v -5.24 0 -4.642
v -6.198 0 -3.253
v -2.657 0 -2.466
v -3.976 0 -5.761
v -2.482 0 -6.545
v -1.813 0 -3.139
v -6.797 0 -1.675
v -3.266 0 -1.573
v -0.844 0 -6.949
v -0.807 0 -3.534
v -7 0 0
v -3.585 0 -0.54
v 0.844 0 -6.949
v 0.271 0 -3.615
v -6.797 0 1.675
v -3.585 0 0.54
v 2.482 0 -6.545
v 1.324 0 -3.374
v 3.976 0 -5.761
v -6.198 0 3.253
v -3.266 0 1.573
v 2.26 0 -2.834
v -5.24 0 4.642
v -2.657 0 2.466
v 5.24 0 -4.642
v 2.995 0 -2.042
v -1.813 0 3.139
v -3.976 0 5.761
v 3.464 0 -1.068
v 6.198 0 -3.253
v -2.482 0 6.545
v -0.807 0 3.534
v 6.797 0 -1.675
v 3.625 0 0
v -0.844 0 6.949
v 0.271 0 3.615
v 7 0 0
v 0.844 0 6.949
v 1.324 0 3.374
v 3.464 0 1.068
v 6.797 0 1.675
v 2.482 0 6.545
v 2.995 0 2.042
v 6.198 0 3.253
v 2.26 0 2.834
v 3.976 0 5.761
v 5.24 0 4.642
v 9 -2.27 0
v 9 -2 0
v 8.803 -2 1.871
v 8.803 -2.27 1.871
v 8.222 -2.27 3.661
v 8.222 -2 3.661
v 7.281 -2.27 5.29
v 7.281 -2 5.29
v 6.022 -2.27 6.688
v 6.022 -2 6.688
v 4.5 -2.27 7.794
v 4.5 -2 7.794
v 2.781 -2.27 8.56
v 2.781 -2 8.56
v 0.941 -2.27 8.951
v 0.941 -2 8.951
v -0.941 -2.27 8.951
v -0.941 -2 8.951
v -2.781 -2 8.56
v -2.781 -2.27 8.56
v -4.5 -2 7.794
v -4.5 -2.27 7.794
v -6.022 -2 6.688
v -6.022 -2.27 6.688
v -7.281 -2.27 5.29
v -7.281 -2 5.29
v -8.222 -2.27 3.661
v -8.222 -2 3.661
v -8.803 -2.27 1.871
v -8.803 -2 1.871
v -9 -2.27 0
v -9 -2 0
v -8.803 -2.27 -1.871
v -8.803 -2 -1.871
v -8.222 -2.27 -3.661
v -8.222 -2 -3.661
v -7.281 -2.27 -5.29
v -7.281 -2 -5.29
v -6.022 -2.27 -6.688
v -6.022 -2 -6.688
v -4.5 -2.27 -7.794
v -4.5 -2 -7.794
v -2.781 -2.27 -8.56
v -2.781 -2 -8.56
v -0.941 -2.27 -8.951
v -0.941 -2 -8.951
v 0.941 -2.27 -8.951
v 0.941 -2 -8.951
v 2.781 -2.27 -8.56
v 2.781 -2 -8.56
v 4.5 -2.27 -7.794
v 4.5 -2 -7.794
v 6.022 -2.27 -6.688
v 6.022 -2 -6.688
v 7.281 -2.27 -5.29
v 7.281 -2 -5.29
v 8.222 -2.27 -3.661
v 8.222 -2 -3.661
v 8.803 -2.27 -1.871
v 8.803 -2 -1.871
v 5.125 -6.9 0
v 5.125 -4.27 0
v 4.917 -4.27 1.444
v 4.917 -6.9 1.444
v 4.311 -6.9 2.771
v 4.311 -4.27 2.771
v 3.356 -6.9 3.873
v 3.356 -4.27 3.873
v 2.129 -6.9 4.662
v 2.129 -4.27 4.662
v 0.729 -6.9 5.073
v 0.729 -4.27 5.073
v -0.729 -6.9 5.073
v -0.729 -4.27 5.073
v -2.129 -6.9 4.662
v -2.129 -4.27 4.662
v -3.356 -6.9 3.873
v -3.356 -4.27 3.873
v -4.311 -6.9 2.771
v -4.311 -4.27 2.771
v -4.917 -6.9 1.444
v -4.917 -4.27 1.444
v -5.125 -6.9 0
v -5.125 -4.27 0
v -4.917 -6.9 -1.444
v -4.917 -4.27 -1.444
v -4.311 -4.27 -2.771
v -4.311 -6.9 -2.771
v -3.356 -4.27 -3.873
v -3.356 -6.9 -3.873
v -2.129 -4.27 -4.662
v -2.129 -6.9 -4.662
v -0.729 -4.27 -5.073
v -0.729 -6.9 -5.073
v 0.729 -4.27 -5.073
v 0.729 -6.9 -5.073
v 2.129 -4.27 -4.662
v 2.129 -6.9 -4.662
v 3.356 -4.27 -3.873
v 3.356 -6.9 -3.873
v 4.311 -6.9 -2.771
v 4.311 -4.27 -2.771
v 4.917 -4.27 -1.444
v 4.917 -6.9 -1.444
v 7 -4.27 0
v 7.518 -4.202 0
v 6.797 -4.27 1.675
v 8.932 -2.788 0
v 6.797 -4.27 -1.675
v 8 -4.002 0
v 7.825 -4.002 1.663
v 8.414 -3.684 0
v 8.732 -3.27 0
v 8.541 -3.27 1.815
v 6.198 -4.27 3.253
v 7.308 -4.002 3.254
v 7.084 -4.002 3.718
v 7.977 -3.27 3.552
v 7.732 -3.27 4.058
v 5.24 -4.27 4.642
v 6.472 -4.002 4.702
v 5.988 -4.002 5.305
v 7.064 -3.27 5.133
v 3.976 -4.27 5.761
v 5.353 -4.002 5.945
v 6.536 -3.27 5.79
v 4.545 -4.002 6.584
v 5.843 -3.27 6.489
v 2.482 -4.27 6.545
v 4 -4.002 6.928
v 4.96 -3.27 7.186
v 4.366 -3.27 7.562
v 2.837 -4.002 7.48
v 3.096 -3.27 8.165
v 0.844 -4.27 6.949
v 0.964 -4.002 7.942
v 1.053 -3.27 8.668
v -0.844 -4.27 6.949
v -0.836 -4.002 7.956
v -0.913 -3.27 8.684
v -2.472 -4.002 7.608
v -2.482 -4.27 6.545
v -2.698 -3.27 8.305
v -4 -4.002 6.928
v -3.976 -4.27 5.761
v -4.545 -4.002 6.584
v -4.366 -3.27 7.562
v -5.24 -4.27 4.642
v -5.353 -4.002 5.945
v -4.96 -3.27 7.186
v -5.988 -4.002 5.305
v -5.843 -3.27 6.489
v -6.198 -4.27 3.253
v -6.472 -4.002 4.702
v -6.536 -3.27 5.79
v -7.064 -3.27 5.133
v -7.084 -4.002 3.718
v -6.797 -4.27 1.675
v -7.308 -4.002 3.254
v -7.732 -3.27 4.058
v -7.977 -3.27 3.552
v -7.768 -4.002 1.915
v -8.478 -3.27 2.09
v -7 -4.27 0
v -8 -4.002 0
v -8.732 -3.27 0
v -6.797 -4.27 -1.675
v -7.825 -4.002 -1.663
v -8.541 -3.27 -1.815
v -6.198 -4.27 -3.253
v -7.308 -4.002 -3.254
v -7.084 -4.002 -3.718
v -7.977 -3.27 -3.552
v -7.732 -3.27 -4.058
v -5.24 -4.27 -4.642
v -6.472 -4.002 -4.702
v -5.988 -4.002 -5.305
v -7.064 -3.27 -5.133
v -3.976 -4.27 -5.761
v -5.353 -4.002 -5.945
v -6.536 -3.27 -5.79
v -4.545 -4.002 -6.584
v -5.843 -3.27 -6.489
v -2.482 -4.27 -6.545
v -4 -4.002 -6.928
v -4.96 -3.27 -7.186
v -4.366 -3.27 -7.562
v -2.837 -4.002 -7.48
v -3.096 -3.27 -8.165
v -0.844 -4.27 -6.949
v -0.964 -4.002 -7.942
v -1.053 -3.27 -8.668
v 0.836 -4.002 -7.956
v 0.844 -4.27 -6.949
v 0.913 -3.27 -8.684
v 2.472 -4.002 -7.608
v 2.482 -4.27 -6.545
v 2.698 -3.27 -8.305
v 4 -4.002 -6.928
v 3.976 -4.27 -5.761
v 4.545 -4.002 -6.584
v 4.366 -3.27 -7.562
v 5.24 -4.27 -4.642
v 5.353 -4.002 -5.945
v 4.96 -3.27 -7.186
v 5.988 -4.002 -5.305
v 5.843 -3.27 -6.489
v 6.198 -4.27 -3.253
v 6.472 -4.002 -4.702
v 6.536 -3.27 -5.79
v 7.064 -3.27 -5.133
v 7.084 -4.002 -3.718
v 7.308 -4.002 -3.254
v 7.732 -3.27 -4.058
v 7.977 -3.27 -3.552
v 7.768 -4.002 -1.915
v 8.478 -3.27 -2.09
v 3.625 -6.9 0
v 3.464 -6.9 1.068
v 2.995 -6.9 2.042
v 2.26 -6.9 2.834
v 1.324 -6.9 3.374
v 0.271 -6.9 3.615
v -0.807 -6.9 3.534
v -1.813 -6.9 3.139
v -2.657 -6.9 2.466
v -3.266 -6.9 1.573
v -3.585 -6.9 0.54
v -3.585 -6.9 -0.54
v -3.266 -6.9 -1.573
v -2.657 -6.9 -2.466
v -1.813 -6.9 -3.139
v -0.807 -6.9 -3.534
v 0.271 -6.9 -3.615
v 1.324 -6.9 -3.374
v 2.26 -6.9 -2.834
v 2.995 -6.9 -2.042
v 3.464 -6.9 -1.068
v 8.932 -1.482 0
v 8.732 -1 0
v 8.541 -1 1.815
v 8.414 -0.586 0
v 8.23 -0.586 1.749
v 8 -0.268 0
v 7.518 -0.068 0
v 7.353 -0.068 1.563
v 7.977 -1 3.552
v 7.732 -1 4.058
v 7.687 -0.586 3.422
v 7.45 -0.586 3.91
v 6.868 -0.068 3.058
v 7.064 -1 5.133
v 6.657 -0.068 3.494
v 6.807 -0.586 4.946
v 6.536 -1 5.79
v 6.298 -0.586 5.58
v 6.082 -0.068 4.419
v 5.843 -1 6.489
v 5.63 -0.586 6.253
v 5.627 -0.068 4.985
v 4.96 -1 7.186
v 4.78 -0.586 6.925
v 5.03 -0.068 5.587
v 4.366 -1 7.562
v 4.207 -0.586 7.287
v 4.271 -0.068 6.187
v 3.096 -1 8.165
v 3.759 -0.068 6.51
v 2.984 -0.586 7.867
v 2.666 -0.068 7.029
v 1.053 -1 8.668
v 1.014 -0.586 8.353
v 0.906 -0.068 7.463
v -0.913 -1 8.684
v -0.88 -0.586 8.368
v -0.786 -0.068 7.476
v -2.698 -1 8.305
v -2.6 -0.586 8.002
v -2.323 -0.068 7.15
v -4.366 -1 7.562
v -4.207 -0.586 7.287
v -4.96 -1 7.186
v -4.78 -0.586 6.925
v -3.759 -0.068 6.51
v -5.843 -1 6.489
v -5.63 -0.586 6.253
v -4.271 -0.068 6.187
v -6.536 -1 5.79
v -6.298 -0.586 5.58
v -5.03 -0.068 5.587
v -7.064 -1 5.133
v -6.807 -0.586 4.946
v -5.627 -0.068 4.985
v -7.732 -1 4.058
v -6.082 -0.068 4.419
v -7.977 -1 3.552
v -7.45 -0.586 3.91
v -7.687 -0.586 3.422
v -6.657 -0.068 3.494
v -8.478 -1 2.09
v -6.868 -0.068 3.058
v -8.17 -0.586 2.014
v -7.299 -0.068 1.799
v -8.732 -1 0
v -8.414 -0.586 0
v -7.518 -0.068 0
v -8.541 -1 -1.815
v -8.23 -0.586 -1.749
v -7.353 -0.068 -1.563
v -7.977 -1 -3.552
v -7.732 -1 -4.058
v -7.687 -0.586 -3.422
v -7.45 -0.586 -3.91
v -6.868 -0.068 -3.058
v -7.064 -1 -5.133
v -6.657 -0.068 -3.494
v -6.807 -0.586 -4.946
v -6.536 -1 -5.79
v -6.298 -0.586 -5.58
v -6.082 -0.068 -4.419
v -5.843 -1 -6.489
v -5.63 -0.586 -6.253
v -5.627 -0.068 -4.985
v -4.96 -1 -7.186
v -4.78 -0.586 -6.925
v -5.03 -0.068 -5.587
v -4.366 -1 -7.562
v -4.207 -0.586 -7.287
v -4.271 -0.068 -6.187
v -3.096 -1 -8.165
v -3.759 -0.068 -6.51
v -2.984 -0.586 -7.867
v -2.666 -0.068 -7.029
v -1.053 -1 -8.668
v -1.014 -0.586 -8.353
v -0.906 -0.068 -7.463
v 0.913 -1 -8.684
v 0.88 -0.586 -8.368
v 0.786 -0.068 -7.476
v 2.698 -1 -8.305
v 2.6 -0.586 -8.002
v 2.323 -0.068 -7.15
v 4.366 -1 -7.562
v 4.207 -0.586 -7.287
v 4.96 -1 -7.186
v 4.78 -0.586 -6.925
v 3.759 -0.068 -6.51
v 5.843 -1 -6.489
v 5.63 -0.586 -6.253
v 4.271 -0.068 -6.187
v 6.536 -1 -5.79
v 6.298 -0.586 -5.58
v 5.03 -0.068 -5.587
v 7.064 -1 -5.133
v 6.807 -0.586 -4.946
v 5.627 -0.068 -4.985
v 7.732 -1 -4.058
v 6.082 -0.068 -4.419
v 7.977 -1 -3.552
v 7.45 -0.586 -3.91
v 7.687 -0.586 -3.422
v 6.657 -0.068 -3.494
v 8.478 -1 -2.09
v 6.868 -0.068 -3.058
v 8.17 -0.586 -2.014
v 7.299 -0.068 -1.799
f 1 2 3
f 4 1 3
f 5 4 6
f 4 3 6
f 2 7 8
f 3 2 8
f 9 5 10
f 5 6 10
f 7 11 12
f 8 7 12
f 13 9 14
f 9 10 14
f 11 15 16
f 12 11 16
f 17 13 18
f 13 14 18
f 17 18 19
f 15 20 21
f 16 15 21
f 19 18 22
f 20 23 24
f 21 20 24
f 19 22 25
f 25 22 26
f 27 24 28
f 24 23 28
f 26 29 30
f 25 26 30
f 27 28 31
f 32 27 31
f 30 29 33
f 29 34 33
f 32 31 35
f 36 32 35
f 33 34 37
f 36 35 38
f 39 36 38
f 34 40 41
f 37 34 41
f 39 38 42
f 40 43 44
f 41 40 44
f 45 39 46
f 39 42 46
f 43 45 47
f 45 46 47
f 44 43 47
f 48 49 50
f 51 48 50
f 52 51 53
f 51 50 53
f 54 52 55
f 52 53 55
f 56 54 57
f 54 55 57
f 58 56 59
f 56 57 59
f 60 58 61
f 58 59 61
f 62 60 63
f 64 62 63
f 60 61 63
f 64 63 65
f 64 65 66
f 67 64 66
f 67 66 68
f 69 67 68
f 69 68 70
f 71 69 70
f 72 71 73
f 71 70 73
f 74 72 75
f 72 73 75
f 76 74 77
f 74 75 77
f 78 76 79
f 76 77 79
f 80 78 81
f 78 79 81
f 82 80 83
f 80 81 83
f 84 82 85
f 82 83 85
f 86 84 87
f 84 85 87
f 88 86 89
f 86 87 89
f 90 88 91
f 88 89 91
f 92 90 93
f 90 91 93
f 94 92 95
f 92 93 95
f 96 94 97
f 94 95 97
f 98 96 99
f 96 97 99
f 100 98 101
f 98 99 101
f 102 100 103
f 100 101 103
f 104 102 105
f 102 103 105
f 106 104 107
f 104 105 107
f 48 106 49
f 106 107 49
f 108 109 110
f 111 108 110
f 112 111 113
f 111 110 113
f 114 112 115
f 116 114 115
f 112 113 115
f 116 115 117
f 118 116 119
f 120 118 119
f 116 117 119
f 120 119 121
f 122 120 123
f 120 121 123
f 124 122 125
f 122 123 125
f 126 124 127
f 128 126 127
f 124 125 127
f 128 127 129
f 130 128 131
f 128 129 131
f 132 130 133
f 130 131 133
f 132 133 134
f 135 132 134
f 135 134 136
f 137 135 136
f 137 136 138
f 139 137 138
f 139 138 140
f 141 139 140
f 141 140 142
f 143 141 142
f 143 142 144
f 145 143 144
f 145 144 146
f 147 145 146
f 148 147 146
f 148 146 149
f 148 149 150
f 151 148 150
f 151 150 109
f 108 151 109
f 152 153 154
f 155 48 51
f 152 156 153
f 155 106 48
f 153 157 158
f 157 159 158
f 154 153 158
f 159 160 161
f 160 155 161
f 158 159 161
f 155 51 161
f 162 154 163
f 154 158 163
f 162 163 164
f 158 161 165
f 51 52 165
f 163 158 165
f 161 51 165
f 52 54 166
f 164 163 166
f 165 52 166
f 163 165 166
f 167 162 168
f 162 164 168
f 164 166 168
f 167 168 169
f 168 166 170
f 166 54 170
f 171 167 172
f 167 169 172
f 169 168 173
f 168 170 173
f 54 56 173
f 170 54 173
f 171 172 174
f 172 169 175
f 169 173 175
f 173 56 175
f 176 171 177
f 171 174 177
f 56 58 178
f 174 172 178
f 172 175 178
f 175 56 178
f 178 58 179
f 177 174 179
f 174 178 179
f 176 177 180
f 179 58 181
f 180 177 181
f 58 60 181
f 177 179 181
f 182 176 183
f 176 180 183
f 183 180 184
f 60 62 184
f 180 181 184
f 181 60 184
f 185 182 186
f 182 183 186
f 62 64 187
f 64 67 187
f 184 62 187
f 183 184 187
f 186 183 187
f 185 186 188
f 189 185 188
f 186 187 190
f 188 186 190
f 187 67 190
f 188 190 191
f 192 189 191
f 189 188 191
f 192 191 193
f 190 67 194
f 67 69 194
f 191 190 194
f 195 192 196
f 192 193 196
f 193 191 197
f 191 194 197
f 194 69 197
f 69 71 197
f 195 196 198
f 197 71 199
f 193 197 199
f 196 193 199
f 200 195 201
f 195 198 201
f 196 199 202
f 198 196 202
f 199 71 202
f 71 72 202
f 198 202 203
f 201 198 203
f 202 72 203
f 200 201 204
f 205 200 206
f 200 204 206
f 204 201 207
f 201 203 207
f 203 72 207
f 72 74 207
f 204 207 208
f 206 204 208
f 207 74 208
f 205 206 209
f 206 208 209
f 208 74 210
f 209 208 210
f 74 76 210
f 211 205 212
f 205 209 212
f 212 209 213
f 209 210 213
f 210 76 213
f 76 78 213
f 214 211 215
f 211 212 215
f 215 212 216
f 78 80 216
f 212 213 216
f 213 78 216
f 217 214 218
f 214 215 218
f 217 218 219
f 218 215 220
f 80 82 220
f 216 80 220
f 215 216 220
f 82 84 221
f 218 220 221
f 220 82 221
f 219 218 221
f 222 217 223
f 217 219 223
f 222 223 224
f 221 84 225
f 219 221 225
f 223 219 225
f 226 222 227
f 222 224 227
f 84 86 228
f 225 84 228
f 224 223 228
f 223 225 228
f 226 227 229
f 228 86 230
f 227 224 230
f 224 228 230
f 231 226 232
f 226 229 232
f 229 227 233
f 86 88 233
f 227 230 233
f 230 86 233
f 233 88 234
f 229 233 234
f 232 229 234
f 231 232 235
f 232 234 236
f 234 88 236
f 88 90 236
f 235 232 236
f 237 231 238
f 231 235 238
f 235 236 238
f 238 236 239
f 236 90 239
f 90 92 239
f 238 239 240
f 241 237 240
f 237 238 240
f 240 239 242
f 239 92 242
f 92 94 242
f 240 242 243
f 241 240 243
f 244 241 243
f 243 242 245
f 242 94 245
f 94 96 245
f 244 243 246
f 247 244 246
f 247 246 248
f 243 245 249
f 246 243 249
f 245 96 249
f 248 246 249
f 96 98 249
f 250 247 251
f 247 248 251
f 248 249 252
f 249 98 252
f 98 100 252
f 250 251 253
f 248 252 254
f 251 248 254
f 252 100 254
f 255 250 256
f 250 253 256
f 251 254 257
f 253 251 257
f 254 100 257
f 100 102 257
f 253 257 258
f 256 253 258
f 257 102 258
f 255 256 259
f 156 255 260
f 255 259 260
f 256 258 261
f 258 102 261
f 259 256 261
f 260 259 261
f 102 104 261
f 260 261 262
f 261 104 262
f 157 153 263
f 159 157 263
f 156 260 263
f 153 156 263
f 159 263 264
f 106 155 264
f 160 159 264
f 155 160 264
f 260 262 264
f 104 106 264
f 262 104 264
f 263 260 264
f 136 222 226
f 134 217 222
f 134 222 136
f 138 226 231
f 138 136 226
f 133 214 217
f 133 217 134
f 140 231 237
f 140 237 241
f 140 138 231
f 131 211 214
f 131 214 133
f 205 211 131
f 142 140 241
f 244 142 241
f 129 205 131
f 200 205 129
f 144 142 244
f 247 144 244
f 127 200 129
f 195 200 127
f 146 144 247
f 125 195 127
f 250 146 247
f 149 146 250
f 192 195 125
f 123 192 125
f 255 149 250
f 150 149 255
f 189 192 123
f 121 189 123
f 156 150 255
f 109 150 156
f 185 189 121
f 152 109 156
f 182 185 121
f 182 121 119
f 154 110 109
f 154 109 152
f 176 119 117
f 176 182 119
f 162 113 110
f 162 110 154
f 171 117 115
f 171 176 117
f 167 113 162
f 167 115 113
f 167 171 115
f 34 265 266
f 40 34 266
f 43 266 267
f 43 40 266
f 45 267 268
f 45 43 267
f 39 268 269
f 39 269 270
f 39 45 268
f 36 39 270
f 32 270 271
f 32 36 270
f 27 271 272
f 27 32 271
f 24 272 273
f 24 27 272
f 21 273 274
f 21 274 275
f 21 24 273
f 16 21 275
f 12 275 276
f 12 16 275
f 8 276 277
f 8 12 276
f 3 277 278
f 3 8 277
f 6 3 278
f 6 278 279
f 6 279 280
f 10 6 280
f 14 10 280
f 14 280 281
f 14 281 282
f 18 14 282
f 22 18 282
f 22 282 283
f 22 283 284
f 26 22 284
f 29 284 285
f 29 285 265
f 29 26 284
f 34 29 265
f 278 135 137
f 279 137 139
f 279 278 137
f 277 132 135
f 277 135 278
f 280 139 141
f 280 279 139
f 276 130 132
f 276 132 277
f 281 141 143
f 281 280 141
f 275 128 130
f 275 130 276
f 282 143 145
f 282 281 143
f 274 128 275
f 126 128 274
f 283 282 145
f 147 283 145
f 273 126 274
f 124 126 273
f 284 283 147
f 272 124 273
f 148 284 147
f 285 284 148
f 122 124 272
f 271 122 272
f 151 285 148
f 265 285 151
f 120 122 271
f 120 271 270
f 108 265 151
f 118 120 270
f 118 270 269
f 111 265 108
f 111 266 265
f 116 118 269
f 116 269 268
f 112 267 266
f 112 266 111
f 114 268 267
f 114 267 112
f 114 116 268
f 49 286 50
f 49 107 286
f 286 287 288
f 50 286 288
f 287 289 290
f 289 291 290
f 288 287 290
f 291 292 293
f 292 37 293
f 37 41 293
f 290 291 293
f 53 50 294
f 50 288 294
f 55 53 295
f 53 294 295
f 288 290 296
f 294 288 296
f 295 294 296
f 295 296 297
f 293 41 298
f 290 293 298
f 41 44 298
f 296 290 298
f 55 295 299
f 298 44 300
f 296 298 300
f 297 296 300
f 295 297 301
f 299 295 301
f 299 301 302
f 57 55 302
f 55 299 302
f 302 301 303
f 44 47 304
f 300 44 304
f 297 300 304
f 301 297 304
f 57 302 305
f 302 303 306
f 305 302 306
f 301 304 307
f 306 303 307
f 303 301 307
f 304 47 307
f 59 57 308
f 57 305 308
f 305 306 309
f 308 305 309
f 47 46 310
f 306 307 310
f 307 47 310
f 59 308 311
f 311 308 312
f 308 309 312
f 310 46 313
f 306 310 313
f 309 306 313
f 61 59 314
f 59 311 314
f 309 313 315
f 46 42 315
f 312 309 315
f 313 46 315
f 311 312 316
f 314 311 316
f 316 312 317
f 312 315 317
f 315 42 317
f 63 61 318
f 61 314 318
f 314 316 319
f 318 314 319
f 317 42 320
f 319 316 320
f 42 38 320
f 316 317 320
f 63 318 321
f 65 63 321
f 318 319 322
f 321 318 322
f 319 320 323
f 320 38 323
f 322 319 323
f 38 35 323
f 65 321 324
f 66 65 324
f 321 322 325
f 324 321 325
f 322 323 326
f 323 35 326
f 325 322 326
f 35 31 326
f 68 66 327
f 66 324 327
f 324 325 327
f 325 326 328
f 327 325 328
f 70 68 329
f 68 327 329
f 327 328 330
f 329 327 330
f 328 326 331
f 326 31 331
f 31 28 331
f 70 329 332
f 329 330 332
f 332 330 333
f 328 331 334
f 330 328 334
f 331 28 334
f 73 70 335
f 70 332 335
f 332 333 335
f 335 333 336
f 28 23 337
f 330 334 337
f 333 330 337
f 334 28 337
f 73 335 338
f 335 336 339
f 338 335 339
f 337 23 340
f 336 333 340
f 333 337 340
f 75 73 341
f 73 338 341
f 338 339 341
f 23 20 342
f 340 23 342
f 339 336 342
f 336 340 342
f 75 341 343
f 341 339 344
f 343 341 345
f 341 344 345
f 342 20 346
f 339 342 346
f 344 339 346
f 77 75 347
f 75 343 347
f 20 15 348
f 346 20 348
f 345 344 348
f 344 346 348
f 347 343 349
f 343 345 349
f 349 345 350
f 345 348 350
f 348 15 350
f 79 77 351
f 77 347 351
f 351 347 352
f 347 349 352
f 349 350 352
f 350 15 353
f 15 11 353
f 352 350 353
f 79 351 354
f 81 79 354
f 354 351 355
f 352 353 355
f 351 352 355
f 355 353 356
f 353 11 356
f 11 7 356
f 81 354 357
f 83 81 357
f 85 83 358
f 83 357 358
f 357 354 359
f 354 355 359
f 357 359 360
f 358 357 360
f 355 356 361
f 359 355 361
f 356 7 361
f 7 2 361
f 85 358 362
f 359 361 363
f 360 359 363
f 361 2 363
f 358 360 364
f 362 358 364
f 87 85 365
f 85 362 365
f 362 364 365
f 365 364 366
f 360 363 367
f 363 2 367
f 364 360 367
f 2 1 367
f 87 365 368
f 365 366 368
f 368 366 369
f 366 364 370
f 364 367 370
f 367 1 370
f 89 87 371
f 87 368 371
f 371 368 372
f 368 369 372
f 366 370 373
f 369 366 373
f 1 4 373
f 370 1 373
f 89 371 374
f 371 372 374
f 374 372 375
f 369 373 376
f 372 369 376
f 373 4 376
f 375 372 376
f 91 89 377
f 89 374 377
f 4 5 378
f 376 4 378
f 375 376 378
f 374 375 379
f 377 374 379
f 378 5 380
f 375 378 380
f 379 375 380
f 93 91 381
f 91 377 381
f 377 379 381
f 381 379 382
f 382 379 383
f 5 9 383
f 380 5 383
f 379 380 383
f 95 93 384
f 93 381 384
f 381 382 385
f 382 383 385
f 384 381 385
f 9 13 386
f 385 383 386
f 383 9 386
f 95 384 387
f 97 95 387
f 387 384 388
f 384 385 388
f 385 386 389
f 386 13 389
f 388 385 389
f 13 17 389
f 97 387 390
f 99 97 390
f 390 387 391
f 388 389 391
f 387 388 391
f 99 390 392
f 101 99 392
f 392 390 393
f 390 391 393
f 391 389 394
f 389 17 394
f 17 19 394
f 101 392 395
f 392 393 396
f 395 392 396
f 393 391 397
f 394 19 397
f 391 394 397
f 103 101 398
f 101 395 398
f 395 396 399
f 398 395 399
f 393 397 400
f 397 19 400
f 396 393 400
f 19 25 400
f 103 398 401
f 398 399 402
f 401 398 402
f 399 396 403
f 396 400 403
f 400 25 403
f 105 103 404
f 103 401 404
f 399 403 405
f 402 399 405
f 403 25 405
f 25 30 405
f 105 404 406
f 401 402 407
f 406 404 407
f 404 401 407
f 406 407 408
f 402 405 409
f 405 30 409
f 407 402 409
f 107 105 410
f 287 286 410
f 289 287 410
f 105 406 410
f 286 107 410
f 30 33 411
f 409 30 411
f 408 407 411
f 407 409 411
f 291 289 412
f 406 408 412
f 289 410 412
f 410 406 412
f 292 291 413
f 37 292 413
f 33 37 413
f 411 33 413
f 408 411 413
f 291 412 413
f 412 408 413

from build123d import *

# Parameters (mm, degrees)
F0_R     = 9
F0_R_2   = 5.125
F1_DEPTH = 4.27
F0_R_3   = 3.625
F2_DEPTH = 6.9
F3_R     = 2


with BuildPart() as f1:
    # F0 (on Front) → F1 (new body)
    with BuildSketch(Plane.XZ):
        Circle(F0_R)
        Circle(F0_R_2, mode=Mode.SUBTRACT)
    extrude(amount=F1_DEPTH)

    # F0 (on Front) → F2 (join)
    with BuildSketch(Plane.XZ):
        Circle(F0_R_2)
        Circle(F0_R_3, mode=Mode.SUBTRACT)
    extrude(amount=F2_DEPTH)

    # F3
    f3_edges = [f1.edges().sort_by_distance(p)[0] for p in [
        (-9, -4.27, 0),
        (-9, 0, 0),
    ]]
    fillet(f3_edges, radius=F3_R)


solid = f1.part
